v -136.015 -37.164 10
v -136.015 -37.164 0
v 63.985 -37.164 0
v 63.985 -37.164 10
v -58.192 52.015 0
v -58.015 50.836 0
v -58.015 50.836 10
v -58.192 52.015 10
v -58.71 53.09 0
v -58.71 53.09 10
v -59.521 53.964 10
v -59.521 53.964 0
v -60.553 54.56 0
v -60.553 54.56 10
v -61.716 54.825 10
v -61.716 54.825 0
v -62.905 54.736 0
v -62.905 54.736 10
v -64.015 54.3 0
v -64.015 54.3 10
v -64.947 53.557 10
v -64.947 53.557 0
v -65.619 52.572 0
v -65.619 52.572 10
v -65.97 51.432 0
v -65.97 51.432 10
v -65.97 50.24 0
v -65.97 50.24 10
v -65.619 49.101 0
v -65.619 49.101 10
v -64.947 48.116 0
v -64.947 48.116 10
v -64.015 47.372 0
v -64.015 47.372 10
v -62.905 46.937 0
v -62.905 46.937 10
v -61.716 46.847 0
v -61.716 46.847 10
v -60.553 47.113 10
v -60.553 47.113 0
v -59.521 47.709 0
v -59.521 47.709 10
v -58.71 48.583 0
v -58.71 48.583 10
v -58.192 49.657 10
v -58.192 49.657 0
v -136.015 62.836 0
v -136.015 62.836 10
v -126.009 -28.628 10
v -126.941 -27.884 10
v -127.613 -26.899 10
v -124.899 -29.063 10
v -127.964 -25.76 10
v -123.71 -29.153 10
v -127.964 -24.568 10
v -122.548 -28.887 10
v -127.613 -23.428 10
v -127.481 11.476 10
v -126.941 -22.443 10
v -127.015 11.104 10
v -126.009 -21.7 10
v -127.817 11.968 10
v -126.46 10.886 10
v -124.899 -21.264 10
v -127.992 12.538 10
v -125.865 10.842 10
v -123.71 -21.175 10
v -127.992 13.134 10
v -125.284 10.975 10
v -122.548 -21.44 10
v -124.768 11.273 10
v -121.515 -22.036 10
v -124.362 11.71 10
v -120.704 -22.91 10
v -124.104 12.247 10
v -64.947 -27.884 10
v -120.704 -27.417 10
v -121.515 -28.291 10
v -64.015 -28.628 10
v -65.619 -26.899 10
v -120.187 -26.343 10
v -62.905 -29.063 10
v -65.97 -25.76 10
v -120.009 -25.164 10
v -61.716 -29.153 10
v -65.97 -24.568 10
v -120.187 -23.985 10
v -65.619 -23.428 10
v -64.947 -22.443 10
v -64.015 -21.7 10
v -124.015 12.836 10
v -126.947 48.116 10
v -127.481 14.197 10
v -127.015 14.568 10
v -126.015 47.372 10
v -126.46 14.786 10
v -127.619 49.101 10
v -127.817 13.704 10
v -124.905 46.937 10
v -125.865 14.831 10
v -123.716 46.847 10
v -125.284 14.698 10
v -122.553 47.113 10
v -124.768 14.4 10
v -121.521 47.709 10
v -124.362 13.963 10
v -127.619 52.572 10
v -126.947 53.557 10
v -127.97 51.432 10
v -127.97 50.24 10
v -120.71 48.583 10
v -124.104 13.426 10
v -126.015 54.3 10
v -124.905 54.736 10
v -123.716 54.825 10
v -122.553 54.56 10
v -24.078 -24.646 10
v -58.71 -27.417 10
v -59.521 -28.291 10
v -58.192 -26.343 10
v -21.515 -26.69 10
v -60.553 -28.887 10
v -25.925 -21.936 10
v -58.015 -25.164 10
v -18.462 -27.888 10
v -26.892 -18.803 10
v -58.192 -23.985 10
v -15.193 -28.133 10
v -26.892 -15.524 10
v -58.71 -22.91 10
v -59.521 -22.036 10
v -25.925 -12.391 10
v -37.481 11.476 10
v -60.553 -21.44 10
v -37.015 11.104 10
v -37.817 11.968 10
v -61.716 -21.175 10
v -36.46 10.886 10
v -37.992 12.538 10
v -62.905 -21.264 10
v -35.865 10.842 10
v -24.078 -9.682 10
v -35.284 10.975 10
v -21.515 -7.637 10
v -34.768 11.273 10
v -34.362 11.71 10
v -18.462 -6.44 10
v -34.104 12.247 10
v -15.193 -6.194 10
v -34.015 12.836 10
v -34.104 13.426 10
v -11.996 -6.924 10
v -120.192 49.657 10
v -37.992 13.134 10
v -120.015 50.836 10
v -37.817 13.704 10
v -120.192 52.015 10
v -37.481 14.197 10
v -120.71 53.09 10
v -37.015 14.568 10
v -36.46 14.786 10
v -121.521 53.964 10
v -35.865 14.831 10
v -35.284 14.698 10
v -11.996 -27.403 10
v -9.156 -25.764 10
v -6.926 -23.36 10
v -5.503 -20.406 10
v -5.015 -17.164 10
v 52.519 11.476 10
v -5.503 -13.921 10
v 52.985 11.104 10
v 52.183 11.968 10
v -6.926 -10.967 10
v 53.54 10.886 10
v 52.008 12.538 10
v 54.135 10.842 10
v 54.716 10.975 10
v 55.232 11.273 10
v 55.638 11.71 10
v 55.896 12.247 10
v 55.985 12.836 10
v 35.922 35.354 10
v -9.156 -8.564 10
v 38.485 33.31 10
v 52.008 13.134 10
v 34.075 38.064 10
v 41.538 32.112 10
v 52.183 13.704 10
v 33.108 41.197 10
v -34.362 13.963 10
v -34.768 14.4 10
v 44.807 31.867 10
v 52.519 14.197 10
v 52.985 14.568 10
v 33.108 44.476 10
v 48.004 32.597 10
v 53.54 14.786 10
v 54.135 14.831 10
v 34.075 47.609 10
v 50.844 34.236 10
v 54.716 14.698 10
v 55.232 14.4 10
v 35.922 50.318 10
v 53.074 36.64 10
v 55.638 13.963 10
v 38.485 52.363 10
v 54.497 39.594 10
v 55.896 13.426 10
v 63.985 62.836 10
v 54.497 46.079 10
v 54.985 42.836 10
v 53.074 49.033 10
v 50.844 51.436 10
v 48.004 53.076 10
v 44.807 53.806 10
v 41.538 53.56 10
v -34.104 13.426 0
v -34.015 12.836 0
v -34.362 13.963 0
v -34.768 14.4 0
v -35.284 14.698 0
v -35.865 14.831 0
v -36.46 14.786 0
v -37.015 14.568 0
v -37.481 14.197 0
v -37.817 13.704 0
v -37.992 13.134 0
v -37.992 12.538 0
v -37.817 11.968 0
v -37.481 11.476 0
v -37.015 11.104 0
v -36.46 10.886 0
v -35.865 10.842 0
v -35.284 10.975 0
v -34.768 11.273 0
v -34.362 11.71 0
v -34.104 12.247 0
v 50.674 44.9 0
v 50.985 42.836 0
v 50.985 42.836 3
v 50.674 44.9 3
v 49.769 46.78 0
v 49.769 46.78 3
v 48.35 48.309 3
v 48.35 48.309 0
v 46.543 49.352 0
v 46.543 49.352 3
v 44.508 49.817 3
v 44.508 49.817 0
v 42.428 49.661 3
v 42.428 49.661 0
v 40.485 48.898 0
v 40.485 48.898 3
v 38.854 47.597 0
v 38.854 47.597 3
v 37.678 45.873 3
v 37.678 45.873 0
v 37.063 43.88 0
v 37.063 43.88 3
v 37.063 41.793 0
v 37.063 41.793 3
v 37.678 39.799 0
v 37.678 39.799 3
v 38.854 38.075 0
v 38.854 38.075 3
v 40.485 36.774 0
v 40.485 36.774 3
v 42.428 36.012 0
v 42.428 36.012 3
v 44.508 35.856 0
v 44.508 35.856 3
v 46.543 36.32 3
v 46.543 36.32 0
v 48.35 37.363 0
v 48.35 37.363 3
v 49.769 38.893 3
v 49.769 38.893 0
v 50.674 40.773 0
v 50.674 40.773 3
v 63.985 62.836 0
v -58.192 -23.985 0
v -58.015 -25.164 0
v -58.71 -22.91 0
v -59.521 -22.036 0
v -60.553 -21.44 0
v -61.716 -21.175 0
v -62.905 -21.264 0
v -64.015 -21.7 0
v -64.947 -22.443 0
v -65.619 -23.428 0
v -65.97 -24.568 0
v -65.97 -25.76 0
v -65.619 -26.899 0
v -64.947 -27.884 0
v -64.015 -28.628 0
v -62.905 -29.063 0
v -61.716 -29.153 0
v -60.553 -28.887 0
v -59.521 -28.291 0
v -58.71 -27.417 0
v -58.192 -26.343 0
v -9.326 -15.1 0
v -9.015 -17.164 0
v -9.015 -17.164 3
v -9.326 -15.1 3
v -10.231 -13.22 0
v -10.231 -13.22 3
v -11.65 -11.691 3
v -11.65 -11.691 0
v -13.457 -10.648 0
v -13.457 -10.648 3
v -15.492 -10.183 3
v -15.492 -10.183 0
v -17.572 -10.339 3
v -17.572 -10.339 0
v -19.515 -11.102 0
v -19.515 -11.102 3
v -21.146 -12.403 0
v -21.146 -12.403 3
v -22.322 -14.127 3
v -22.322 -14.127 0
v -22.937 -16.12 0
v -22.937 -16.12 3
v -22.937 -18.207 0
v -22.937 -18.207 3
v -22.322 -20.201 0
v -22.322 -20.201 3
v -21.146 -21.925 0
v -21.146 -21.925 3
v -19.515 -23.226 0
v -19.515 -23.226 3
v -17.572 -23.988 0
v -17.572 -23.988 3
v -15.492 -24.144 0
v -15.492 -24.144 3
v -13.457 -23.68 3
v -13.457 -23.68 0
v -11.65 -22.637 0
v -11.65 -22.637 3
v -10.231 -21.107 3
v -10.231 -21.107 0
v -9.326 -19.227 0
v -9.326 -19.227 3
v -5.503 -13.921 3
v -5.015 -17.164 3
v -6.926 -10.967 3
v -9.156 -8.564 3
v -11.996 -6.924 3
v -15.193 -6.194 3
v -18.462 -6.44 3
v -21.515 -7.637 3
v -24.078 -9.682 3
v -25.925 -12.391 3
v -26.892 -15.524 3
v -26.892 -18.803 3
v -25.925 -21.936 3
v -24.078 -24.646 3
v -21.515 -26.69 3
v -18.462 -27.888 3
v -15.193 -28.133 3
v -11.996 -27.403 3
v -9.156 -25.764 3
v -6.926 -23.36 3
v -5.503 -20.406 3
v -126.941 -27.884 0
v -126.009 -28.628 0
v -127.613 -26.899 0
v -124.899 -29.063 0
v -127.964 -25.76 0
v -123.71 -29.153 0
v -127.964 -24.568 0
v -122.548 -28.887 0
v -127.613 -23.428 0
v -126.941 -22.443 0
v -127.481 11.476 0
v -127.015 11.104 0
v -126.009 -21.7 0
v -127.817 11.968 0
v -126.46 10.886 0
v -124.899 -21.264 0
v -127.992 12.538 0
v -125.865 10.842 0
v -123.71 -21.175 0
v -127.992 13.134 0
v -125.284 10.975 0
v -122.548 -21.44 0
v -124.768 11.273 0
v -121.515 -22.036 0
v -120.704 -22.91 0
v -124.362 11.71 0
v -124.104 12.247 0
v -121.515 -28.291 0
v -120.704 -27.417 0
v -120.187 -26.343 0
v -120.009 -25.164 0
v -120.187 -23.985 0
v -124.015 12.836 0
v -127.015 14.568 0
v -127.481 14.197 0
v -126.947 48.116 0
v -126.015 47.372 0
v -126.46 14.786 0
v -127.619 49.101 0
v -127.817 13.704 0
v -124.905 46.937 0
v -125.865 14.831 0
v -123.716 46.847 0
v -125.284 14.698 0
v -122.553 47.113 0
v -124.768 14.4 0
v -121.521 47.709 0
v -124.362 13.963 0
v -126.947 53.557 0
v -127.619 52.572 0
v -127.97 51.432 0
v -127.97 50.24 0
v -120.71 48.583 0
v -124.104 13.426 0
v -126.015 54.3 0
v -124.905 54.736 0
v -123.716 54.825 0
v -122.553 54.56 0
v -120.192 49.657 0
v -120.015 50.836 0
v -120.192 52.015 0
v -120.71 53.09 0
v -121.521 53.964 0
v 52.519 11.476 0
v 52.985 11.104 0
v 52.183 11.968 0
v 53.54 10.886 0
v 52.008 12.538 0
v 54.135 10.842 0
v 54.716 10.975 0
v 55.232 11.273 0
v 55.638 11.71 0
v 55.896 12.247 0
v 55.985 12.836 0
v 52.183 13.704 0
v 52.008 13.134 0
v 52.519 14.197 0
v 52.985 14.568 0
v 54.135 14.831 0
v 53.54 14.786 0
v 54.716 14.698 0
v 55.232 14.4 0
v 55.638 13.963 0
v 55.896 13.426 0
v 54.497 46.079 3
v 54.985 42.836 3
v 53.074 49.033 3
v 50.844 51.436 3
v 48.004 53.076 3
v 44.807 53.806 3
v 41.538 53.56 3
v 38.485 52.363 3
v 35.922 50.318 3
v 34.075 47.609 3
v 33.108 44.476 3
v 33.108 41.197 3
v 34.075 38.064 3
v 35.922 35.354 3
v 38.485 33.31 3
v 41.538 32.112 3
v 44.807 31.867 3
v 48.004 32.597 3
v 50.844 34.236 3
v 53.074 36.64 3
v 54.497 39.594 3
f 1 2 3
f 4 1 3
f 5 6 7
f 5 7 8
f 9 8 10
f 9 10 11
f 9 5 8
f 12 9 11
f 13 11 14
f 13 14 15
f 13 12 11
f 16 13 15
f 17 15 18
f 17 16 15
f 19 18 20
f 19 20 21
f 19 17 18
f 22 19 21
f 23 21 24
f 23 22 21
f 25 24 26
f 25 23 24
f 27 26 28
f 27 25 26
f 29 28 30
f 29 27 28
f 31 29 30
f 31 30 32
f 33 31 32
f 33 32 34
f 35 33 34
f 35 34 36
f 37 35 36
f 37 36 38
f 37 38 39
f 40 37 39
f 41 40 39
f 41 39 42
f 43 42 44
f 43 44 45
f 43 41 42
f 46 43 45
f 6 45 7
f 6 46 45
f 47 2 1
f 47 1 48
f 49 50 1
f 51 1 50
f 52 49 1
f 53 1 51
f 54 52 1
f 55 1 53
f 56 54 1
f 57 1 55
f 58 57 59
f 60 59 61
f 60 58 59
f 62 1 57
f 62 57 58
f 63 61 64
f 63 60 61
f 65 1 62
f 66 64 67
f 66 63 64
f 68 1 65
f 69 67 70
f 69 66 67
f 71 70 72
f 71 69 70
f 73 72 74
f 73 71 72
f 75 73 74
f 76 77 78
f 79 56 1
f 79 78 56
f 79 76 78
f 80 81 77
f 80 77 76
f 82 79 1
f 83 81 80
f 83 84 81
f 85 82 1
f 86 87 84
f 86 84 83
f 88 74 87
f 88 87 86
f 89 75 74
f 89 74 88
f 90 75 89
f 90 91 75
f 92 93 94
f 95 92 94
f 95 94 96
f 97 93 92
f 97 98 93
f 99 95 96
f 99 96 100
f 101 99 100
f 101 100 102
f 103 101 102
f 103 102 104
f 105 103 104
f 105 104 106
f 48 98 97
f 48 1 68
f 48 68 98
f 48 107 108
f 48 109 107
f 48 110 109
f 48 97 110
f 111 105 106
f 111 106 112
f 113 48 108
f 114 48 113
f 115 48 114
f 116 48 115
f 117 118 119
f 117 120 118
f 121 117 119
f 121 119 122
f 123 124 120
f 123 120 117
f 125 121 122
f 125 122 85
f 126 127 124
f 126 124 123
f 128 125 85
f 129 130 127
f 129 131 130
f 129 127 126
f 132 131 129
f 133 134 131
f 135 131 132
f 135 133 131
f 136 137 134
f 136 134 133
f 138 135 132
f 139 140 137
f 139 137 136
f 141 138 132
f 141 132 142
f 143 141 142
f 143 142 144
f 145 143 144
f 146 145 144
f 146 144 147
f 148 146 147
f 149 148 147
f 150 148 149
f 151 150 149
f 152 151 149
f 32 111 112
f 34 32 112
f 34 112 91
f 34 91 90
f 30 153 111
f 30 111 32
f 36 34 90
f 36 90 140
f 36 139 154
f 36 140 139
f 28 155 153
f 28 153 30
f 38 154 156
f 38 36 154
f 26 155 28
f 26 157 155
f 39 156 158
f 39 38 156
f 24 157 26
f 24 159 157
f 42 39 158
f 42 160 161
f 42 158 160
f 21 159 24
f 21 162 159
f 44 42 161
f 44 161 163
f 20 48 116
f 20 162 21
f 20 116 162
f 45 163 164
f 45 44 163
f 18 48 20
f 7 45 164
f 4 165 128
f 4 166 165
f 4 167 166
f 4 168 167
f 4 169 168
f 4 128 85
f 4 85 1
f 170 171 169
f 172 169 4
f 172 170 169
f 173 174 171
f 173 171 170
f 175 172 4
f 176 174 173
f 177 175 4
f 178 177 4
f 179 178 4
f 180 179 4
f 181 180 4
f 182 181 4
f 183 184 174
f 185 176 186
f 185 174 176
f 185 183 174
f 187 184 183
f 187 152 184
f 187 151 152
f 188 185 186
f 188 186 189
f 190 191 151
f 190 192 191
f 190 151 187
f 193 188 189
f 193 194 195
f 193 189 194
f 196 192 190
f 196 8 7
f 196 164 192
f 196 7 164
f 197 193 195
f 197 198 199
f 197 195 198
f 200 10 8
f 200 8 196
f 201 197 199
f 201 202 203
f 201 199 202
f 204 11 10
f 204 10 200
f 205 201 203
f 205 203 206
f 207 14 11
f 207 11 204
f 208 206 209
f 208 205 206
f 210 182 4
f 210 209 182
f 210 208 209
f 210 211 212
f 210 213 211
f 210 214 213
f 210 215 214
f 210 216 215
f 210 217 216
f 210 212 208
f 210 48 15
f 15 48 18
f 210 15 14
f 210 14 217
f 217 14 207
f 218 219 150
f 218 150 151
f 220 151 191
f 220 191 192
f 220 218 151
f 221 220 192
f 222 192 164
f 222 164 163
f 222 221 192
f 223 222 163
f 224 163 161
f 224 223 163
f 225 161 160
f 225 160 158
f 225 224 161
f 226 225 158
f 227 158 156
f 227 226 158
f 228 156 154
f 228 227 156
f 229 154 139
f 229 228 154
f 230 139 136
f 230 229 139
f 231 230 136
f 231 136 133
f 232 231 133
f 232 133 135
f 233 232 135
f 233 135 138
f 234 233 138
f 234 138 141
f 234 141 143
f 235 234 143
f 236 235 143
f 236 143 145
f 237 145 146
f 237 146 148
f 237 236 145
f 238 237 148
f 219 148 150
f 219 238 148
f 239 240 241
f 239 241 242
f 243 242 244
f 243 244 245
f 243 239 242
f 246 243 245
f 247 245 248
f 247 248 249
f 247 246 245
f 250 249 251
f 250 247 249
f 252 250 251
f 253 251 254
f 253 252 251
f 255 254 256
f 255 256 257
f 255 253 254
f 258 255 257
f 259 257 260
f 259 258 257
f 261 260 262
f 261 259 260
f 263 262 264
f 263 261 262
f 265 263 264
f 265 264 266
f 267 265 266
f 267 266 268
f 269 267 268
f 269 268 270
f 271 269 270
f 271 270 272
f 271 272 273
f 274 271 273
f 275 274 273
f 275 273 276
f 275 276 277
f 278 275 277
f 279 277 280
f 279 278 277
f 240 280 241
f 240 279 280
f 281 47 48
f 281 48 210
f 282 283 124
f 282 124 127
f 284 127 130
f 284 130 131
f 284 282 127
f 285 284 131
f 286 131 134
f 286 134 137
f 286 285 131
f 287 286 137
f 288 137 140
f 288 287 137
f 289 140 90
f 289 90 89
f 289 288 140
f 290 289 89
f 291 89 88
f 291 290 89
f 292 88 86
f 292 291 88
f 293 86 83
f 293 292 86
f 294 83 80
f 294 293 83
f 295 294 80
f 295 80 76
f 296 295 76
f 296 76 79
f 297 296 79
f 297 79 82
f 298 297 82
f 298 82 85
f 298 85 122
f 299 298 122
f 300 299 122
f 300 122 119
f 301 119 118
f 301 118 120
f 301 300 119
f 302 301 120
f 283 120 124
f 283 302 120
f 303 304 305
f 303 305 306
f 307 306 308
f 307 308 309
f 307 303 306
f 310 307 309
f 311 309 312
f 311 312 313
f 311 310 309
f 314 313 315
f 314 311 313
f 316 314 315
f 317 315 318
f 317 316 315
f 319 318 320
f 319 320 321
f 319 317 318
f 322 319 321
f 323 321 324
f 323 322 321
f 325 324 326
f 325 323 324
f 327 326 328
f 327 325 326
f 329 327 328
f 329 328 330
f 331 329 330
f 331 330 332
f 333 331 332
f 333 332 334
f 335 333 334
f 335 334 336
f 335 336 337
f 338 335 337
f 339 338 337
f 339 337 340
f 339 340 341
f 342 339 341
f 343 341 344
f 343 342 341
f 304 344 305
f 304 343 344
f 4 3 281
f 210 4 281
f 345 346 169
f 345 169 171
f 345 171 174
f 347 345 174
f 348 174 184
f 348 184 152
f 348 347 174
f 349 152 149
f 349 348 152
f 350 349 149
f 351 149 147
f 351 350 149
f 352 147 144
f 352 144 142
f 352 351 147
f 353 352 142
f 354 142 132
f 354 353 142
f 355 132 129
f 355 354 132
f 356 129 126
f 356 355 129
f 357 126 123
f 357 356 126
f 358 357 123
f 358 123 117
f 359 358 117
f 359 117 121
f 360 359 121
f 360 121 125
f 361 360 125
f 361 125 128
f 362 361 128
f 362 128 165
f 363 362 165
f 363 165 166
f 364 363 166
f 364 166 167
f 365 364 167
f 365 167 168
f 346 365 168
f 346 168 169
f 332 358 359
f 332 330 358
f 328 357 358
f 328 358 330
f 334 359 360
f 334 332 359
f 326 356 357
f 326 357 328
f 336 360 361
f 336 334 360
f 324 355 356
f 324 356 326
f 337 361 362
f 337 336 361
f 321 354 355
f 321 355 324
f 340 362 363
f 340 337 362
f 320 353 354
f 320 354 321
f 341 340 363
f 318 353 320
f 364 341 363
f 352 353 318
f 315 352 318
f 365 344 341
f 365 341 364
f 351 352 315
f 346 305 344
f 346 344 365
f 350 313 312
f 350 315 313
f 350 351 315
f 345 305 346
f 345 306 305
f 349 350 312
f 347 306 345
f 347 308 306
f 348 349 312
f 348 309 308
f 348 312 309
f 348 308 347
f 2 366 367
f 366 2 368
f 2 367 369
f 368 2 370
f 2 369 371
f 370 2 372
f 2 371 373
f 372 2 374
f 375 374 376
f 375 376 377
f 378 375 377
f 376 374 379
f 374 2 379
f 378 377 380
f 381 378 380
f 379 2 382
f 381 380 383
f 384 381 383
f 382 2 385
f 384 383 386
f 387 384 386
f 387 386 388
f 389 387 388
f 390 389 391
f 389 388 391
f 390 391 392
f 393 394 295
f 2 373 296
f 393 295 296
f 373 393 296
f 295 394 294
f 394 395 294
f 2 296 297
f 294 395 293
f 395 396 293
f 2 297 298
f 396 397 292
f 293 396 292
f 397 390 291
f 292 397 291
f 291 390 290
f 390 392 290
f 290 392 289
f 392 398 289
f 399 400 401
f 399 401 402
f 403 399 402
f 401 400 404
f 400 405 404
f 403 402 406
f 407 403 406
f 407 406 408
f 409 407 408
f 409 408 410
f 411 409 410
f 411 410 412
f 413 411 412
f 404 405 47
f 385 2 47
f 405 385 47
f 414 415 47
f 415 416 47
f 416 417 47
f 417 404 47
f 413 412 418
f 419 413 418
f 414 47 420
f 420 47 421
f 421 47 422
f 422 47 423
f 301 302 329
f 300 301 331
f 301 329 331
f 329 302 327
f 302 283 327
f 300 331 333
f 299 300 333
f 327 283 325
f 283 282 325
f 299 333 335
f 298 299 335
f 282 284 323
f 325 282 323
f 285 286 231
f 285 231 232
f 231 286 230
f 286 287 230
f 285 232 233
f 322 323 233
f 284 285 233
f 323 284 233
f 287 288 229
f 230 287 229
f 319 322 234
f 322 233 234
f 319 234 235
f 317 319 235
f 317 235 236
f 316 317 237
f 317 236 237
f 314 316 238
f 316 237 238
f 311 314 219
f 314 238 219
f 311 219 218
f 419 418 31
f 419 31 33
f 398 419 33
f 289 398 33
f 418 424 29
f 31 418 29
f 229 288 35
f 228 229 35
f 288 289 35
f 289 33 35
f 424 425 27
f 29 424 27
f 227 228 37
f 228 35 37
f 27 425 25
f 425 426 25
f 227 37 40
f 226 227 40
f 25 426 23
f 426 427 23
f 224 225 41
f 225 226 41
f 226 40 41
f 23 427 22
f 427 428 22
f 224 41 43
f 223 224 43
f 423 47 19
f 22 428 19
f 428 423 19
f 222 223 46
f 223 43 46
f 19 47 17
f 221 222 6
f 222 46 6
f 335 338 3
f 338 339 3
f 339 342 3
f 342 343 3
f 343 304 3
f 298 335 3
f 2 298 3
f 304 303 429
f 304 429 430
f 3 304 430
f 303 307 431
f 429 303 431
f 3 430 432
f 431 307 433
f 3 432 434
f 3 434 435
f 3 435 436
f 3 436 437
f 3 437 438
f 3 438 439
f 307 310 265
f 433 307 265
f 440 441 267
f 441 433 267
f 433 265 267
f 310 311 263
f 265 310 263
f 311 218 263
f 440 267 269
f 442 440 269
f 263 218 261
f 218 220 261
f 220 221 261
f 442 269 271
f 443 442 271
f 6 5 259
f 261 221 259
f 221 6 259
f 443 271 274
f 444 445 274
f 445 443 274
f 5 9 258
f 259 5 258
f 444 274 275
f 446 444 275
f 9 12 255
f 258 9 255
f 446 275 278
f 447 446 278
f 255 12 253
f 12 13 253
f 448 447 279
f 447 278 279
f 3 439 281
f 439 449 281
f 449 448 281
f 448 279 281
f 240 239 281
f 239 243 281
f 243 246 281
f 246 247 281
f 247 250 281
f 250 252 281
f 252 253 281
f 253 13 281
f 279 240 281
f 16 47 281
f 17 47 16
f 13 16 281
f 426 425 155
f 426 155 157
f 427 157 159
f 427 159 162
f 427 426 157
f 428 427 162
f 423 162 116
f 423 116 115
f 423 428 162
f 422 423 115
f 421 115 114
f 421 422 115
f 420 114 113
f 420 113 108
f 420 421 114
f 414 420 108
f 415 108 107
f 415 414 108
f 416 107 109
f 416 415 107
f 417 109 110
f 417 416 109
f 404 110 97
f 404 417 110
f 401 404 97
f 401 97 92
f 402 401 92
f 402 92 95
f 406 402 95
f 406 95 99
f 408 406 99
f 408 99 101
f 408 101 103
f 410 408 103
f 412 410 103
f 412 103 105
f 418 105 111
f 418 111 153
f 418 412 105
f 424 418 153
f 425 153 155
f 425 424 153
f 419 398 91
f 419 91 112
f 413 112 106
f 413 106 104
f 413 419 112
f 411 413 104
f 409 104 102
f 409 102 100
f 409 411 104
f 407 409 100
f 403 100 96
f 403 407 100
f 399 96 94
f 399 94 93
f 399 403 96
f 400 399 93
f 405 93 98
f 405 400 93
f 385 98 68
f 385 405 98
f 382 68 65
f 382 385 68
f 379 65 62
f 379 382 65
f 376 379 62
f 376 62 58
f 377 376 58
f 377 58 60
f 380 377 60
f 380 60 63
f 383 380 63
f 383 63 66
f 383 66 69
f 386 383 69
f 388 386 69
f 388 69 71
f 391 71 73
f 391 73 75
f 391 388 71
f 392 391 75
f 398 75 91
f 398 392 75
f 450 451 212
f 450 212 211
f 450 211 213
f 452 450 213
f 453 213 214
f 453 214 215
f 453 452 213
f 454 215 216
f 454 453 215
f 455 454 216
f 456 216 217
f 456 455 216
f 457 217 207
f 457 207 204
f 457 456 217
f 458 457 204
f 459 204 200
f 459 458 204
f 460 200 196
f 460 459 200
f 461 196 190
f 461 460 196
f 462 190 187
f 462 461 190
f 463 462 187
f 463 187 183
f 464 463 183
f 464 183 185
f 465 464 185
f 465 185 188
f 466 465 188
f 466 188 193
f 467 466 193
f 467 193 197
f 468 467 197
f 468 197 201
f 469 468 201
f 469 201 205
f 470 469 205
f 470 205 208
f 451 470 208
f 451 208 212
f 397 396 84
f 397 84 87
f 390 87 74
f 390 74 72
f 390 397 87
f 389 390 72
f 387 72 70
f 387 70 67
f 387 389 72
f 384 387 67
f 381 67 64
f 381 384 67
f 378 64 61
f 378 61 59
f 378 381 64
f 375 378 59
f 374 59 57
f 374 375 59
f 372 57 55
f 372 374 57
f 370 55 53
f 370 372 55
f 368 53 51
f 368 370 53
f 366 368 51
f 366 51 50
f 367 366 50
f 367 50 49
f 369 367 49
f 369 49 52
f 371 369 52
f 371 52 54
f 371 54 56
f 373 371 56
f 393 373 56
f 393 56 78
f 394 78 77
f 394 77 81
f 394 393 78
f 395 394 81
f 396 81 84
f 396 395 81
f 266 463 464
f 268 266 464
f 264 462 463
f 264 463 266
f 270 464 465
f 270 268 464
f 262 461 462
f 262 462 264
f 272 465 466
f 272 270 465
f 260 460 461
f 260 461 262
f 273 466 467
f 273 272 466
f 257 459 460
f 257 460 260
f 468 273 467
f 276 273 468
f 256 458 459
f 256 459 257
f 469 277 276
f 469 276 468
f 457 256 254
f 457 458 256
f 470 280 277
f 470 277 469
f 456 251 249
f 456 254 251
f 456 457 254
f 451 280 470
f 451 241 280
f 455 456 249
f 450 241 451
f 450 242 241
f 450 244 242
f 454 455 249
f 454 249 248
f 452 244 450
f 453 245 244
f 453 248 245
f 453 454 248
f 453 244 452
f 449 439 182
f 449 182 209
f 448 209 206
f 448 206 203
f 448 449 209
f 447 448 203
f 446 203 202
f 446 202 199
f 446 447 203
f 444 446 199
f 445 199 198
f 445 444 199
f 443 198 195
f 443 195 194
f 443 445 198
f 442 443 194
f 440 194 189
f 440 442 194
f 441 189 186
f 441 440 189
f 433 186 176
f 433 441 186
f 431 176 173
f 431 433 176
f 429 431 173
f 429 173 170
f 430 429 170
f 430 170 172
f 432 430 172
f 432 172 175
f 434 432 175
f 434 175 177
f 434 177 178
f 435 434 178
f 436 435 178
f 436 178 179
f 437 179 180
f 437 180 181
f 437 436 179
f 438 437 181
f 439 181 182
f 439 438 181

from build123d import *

# Parameters (mm, degrees)
F0_W     = 200
F0_H     = 100
F0_R     = 4
F0_R_2   = 11
F0_R_3   = 2
F1_DEPTH = 10
F0_R_4   = 7
F2_DEPTH = 3


with BuildPart() as f1:
    # F0 (on Top) → F1 (new body)
    with BuildSketch(Plane.XY):
        with Locations((-36.014734, 12.836266)):
            Rectangle(F0_W, F0_H)
        with Locations((-124.00907, -25.163734)):
            Circle(F0_R, mode=Mode.SUBTRACT)
        with Locations((-62.014734, -25.163734)):
            Circle(F0_R, mode=Mode.SUBTRACT)
        with Locations((-16.014734, -17.163734)):
            Circle(F0_R_2, mode=Mode.SUBTRACT)
        with Locations((-126.014734, 12.836266)):
            Circle(F0_R_3, mode=Mode.SUBTRACT)
        with Locations((-124.014734, 50.836266)):
            Circle(F0_R, mode=Mode.SUBTRACT)
        with Locations((-62.014734, 50.836266)):
            Circle(F0_R, mode=Mode.SUBTRACT)
        with Locations((-36.014734, 12.836266)):
            Circle(F0_R_3, mode=Mode.SUBTRACT)
        with Locations((53.985266, 12.836266)):
            Circle(F0_R_3, mode=Mode.SUBTRACT)
        with Locations((43.985266, 42.836266)):
            Circle(F0_R_2, mode=Mode.SUBTRACT)
    extrude(amount=F1_DEPTH)

    # F0 (on Top) → F2 (join)
    with BuildSketch(Plane.XY):
        with Locations((-16.014734, -17.163734)):
            Circle(F0_R_2)
        with Locations((-16.014734, -17.163734)):
            Circle(F0_R_4, mode=Mode.SUBTRACT)
        with Locations((43.985266, 42.836266)):
            Circle(F0_R_2)
        with Locations((43.985266, 42.836266)):
            Circle(F0_R_4, mode=Mode.SUBTRACT)
    extrude(amount=F2_DEPTH)


solid = f1.part
